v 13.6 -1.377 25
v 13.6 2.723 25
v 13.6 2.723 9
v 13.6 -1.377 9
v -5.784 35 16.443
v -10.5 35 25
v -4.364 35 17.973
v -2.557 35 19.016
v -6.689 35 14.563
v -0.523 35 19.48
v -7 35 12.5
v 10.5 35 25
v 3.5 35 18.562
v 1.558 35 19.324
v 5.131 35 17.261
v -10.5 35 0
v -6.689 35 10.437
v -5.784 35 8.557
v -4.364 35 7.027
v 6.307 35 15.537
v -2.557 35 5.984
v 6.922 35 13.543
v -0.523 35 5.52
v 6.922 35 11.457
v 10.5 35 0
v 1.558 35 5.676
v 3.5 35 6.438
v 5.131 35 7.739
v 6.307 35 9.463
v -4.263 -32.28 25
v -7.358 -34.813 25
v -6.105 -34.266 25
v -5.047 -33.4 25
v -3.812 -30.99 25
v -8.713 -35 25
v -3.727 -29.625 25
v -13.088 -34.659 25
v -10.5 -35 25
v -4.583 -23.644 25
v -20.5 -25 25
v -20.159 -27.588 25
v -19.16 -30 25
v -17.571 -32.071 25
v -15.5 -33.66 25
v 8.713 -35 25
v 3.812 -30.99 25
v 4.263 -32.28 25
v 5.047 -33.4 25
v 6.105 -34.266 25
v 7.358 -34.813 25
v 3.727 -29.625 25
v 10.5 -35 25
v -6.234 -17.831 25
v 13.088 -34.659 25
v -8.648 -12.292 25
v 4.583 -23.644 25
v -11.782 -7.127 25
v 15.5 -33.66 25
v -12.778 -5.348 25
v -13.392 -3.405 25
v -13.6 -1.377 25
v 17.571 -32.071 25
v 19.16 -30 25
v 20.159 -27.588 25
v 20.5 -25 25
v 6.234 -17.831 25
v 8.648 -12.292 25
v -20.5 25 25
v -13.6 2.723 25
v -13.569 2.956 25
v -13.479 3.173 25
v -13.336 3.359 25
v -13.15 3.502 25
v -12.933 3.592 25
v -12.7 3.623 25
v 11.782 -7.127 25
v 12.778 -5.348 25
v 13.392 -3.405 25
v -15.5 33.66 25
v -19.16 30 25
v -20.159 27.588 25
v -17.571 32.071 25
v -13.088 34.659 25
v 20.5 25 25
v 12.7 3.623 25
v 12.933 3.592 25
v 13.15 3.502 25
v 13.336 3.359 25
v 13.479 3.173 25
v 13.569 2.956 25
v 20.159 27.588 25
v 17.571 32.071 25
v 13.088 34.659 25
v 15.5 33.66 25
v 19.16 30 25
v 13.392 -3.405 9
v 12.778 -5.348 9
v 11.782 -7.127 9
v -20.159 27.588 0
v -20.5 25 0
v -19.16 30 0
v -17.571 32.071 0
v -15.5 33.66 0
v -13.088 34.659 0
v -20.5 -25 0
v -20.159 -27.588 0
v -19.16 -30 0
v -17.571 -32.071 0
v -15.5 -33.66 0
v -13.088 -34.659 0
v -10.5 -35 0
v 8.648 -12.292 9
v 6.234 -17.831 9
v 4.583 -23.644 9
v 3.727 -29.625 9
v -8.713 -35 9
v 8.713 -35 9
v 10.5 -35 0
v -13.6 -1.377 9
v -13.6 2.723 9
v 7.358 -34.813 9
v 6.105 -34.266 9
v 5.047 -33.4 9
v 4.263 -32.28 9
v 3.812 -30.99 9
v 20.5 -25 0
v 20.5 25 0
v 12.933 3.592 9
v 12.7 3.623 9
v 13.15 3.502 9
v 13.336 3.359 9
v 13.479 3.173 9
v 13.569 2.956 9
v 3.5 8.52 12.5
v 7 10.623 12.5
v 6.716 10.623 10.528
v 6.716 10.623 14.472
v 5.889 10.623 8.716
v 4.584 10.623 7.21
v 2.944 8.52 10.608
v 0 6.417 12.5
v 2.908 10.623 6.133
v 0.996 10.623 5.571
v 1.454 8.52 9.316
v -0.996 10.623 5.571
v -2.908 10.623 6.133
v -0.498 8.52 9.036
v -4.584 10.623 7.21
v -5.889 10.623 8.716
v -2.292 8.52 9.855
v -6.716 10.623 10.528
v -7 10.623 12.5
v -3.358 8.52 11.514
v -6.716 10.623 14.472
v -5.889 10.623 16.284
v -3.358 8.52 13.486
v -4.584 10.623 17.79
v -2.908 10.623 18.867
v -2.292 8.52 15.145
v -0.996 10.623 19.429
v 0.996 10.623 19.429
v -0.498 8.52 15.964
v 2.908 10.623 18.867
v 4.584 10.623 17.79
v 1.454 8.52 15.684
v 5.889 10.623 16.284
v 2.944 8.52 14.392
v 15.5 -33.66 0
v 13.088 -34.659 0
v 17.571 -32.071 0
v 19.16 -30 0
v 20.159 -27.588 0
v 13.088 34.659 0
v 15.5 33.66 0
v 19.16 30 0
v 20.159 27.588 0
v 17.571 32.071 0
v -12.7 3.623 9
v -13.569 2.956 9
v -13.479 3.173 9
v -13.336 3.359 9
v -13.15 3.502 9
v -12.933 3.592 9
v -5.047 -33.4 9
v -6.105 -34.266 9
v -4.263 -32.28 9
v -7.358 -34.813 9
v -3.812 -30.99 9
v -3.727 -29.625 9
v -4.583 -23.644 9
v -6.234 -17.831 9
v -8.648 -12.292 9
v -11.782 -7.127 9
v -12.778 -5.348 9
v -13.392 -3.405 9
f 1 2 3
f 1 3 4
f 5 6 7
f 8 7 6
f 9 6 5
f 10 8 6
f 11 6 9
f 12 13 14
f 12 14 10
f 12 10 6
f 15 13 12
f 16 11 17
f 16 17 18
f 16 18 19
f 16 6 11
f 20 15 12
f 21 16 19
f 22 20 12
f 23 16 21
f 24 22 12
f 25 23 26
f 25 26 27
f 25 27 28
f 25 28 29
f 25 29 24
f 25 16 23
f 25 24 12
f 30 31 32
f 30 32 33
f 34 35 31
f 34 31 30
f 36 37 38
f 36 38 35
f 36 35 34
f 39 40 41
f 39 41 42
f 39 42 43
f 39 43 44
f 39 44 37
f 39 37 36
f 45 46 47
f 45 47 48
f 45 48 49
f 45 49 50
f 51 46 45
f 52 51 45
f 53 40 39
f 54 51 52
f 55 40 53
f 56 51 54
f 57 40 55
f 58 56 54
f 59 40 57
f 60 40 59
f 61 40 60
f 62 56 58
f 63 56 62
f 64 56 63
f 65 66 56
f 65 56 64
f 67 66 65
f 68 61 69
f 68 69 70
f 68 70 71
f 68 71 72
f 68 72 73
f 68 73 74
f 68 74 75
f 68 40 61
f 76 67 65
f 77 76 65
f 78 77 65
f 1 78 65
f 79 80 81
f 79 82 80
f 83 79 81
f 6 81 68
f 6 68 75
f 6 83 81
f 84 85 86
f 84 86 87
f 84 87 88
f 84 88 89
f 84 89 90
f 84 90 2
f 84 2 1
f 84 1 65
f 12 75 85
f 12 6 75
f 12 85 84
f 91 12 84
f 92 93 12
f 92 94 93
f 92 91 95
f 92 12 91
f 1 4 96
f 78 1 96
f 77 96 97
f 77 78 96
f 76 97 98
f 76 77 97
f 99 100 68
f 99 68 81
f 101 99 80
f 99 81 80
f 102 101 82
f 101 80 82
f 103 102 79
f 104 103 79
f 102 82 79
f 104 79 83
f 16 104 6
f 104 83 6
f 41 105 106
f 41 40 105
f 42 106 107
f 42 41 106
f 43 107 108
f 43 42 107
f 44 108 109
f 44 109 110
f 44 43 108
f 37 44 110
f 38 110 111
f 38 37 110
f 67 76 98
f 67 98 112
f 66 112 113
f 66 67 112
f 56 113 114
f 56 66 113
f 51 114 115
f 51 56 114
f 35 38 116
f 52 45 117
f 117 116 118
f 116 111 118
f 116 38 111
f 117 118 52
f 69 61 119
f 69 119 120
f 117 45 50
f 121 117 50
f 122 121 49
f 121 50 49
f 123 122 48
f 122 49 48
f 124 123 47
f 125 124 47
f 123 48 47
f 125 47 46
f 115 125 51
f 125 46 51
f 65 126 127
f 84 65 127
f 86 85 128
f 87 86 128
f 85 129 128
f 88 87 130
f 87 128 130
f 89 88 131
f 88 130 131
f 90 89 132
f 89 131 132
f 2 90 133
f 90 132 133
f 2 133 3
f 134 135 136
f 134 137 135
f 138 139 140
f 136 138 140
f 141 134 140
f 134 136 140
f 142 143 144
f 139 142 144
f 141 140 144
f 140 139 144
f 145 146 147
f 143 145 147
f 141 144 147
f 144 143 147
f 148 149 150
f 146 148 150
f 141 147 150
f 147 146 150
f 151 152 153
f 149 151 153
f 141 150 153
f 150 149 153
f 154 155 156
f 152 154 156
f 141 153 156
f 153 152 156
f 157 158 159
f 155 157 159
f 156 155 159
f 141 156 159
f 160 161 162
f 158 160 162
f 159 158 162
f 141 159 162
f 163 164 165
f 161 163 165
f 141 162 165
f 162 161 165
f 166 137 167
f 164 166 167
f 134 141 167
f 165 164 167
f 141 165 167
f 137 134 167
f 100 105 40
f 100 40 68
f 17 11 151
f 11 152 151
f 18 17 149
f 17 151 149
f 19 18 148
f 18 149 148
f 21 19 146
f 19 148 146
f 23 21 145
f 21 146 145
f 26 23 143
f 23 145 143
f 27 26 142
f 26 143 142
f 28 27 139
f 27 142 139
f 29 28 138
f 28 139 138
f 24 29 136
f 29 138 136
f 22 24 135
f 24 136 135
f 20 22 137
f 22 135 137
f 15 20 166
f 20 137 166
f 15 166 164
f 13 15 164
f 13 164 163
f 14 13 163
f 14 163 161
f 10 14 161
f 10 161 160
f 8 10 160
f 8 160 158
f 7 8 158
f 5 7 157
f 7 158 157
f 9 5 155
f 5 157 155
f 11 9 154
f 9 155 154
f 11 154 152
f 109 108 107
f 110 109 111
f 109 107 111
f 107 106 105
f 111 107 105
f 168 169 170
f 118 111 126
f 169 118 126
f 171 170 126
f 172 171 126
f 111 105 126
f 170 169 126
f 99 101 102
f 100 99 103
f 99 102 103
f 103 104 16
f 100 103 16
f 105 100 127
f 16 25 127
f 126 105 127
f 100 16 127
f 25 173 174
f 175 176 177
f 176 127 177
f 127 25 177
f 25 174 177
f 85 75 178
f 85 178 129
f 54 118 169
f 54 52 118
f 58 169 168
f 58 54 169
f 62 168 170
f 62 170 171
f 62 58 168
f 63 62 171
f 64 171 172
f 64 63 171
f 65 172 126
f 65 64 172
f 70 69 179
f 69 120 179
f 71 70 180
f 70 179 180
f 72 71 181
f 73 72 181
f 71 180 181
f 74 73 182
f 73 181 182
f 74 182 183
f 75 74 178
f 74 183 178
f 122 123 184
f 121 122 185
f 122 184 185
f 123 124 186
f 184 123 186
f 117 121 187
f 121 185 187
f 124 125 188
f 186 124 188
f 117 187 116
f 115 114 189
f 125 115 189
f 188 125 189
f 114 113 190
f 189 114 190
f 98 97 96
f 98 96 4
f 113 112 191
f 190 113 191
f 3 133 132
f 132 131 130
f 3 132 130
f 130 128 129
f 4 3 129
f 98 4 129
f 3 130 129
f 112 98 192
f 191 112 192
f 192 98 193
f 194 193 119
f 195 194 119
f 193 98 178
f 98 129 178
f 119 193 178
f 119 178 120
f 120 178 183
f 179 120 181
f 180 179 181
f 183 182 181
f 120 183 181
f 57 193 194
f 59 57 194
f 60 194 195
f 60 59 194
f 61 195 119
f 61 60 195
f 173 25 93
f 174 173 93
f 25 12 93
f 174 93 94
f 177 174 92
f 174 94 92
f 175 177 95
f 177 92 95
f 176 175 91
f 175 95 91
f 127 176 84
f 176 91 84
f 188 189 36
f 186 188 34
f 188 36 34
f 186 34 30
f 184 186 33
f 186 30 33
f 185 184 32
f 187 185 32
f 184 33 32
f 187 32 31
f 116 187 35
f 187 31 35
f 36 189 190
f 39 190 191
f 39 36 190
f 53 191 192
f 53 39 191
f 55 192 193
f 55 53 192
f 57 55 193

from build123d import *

# Parameters (mm, degrees)
SKETCH1_W                        = 41
SKETCH1_H                        = 70
BOSS_EXTRUDE1_DEPTH              = 25
CUT_EXTRUDE1_DEPTH               = 16
TAP_DRILL_FOR_M16X2_0_TAP1_D     = 14
TAP_DRILL_FOR_M16X2_0_TAP1_DEPTH = 24.377223398
TAP_DRILL_FOR_M16X2_0_TAP1_TIP   = 4.206024333
FILLET1_R                        = 10
FILLET2_R                        = 0.9
FILLET4_R                        = 5


with BuildPart() as part:
    # Sketch1 → Boss-Extrude1 (new body)
    with BuildSketch(Plane.XY):
        Rectangle(SKETCH1_W, SKETCH1_H)
    extrude(amount=BOSS_EXTRUDE1_DEPTH)

    # Sketch6 → Cut-Extrude1 (cut)
    with BuildSketch(Plane.XY.offset(25)):
        with BuildLine():
            Line((-3.6, -35), (-3.6, -33))
            ThreePointArc((-3.6, -33), (-5.694183484, -19.431989494), (-11.781818182, -7.126819144))
            ThreePointArc((-11.781818182, -7.126819144), (-13.134625892, -4.392336844), (-13.6, -1.377223398))
            Line((-13.6, -1.377223398), (-13.6, 3.622776602))
            Line((-13.6, 3.622776602), (13.6, 3.622776602))
            Line((13.6, 3.622776602), (13.6, -1.377223398))
            ThreePointArc((13.6, -1.377223398), (13.134625892, -4.392336844), (11.781818182, -7.126819144))
            ThreePointArc((11.781818182, -7.126819144), (5.694183484, -19.431989494), (3.6, -33))
            Line((3.6, -33), (3.6, -35))
            Line((3.6, -35), (-3.6, -35))
        make_face()
    extrude(amount=-CUT_EXTRUDE1_DEPTH, mode=Mode.SUBTRACT)

    # Tap Drill for M16x2.0 Tap1
    with Locations(Plane(origin=(0, 35, 0), x_dir=(1, 0, 0), z_dir=(0, 1, 0))):
        with Locations((0, -12.5)):
            Hole(TAP_DRILL_FOR_M16X2_0_TAP1_D / 2, depth=TAP_DRILL_FOR_M16X2_0_TAP1_DEPTH)
            with Locations((0, 0, -(TAP_DRILL_FOR_M16X2_0_TAP1_DEPTH + TAP_DRILL_FOR_M16X2_0_TAP1_TIP / 2))):  # 118° drill point
                Cone(0, TAP_DRILL_FOR_M16X2_0_TAP1_D / 2, TAP_DRILL_FOR_M16X2_0_TAP1_TIP, mode=Mode.SUBTRACT)

    # Fillet1
    fillet1_edges = [part.edges().sort_by_distance(p)[0] for p in [
        (20.5, -35, 12.5),
        (-20.5, -35, 12.5),
        (-20.5, 35, 12.5),
        (20.5, 35, 12.5),
    ]]
    fillet(fillet1_edges, radius=FILLET1_R)

    # Fillet2
    fillet2_edges = [part.edges().sort_by_distance(p)[0] for p in [
        (-13.6, 3.622776602, 17),
        (13.6, 3.622776602, 17),
    ]]
    fillet(fillet2_edges, radius=FILLET2_R)

    # Fillet4
    # the kernel refuses this fillet: 5 mm, written as the material it takes off along each edge
    with BuildSketch(Plane(origin=(3.6, -35, 38.441235127), x_dir=(1, 0, 0), z_dir=(0, 0, -1))) as fillet4_piece_1:
        with BuildLine():
            CenterArc((5.11265865, -5), FILLET4_R, 90, 94.301222305)
            Line((0.126740981, -5.375), (-0.371850786, -5.4125))
            ThreePointArc((-0.371850786, -5.4125), (-0.5, -2), (-0.5, 0))
            Line((-0.5, 0), (0, 0.5))
            Line((0, 0.5), (5.11265865, 0.5))
            Line((5.11265865, 0.5), (5.11265865, 0))
        make_face()
    extrude(amount=29.441235127, mode=Mode.SUBTRACT)
    with BuildSketch(Plane(origin=(-3.6, -35, 38.441235127), x_dir=(-0.0235731649015064, 0.9997221143380427, 0), z_dir=(0, 0, -1))) as fillet4_piece_2:
        with BuildLine():
            CenterArc((5.119132117, -4.993372091), FILLET4_R, 87.049545676, 94.301222305)
            Line((0.120521545, -5.111237915), (-0.379339512, -5.123024498))
            Line((-0.379339512, -5.123024498), (-0.499861057, -0.011786582))
            Line((-0.499861057, -0.011786582), (-0.011786582, 0.499861057))
            ThreePointArc((-0.011786582, 0.499861057), (1.987657646, 0.547007387), (5.402230244, 0.499337209))
            Line((5.402230244, 0.499337209), (5.376494051, 0))
        make_face()
    extrude(amount=29.441235127, mode=Mode.SUBTRACT)


solid = part.part
